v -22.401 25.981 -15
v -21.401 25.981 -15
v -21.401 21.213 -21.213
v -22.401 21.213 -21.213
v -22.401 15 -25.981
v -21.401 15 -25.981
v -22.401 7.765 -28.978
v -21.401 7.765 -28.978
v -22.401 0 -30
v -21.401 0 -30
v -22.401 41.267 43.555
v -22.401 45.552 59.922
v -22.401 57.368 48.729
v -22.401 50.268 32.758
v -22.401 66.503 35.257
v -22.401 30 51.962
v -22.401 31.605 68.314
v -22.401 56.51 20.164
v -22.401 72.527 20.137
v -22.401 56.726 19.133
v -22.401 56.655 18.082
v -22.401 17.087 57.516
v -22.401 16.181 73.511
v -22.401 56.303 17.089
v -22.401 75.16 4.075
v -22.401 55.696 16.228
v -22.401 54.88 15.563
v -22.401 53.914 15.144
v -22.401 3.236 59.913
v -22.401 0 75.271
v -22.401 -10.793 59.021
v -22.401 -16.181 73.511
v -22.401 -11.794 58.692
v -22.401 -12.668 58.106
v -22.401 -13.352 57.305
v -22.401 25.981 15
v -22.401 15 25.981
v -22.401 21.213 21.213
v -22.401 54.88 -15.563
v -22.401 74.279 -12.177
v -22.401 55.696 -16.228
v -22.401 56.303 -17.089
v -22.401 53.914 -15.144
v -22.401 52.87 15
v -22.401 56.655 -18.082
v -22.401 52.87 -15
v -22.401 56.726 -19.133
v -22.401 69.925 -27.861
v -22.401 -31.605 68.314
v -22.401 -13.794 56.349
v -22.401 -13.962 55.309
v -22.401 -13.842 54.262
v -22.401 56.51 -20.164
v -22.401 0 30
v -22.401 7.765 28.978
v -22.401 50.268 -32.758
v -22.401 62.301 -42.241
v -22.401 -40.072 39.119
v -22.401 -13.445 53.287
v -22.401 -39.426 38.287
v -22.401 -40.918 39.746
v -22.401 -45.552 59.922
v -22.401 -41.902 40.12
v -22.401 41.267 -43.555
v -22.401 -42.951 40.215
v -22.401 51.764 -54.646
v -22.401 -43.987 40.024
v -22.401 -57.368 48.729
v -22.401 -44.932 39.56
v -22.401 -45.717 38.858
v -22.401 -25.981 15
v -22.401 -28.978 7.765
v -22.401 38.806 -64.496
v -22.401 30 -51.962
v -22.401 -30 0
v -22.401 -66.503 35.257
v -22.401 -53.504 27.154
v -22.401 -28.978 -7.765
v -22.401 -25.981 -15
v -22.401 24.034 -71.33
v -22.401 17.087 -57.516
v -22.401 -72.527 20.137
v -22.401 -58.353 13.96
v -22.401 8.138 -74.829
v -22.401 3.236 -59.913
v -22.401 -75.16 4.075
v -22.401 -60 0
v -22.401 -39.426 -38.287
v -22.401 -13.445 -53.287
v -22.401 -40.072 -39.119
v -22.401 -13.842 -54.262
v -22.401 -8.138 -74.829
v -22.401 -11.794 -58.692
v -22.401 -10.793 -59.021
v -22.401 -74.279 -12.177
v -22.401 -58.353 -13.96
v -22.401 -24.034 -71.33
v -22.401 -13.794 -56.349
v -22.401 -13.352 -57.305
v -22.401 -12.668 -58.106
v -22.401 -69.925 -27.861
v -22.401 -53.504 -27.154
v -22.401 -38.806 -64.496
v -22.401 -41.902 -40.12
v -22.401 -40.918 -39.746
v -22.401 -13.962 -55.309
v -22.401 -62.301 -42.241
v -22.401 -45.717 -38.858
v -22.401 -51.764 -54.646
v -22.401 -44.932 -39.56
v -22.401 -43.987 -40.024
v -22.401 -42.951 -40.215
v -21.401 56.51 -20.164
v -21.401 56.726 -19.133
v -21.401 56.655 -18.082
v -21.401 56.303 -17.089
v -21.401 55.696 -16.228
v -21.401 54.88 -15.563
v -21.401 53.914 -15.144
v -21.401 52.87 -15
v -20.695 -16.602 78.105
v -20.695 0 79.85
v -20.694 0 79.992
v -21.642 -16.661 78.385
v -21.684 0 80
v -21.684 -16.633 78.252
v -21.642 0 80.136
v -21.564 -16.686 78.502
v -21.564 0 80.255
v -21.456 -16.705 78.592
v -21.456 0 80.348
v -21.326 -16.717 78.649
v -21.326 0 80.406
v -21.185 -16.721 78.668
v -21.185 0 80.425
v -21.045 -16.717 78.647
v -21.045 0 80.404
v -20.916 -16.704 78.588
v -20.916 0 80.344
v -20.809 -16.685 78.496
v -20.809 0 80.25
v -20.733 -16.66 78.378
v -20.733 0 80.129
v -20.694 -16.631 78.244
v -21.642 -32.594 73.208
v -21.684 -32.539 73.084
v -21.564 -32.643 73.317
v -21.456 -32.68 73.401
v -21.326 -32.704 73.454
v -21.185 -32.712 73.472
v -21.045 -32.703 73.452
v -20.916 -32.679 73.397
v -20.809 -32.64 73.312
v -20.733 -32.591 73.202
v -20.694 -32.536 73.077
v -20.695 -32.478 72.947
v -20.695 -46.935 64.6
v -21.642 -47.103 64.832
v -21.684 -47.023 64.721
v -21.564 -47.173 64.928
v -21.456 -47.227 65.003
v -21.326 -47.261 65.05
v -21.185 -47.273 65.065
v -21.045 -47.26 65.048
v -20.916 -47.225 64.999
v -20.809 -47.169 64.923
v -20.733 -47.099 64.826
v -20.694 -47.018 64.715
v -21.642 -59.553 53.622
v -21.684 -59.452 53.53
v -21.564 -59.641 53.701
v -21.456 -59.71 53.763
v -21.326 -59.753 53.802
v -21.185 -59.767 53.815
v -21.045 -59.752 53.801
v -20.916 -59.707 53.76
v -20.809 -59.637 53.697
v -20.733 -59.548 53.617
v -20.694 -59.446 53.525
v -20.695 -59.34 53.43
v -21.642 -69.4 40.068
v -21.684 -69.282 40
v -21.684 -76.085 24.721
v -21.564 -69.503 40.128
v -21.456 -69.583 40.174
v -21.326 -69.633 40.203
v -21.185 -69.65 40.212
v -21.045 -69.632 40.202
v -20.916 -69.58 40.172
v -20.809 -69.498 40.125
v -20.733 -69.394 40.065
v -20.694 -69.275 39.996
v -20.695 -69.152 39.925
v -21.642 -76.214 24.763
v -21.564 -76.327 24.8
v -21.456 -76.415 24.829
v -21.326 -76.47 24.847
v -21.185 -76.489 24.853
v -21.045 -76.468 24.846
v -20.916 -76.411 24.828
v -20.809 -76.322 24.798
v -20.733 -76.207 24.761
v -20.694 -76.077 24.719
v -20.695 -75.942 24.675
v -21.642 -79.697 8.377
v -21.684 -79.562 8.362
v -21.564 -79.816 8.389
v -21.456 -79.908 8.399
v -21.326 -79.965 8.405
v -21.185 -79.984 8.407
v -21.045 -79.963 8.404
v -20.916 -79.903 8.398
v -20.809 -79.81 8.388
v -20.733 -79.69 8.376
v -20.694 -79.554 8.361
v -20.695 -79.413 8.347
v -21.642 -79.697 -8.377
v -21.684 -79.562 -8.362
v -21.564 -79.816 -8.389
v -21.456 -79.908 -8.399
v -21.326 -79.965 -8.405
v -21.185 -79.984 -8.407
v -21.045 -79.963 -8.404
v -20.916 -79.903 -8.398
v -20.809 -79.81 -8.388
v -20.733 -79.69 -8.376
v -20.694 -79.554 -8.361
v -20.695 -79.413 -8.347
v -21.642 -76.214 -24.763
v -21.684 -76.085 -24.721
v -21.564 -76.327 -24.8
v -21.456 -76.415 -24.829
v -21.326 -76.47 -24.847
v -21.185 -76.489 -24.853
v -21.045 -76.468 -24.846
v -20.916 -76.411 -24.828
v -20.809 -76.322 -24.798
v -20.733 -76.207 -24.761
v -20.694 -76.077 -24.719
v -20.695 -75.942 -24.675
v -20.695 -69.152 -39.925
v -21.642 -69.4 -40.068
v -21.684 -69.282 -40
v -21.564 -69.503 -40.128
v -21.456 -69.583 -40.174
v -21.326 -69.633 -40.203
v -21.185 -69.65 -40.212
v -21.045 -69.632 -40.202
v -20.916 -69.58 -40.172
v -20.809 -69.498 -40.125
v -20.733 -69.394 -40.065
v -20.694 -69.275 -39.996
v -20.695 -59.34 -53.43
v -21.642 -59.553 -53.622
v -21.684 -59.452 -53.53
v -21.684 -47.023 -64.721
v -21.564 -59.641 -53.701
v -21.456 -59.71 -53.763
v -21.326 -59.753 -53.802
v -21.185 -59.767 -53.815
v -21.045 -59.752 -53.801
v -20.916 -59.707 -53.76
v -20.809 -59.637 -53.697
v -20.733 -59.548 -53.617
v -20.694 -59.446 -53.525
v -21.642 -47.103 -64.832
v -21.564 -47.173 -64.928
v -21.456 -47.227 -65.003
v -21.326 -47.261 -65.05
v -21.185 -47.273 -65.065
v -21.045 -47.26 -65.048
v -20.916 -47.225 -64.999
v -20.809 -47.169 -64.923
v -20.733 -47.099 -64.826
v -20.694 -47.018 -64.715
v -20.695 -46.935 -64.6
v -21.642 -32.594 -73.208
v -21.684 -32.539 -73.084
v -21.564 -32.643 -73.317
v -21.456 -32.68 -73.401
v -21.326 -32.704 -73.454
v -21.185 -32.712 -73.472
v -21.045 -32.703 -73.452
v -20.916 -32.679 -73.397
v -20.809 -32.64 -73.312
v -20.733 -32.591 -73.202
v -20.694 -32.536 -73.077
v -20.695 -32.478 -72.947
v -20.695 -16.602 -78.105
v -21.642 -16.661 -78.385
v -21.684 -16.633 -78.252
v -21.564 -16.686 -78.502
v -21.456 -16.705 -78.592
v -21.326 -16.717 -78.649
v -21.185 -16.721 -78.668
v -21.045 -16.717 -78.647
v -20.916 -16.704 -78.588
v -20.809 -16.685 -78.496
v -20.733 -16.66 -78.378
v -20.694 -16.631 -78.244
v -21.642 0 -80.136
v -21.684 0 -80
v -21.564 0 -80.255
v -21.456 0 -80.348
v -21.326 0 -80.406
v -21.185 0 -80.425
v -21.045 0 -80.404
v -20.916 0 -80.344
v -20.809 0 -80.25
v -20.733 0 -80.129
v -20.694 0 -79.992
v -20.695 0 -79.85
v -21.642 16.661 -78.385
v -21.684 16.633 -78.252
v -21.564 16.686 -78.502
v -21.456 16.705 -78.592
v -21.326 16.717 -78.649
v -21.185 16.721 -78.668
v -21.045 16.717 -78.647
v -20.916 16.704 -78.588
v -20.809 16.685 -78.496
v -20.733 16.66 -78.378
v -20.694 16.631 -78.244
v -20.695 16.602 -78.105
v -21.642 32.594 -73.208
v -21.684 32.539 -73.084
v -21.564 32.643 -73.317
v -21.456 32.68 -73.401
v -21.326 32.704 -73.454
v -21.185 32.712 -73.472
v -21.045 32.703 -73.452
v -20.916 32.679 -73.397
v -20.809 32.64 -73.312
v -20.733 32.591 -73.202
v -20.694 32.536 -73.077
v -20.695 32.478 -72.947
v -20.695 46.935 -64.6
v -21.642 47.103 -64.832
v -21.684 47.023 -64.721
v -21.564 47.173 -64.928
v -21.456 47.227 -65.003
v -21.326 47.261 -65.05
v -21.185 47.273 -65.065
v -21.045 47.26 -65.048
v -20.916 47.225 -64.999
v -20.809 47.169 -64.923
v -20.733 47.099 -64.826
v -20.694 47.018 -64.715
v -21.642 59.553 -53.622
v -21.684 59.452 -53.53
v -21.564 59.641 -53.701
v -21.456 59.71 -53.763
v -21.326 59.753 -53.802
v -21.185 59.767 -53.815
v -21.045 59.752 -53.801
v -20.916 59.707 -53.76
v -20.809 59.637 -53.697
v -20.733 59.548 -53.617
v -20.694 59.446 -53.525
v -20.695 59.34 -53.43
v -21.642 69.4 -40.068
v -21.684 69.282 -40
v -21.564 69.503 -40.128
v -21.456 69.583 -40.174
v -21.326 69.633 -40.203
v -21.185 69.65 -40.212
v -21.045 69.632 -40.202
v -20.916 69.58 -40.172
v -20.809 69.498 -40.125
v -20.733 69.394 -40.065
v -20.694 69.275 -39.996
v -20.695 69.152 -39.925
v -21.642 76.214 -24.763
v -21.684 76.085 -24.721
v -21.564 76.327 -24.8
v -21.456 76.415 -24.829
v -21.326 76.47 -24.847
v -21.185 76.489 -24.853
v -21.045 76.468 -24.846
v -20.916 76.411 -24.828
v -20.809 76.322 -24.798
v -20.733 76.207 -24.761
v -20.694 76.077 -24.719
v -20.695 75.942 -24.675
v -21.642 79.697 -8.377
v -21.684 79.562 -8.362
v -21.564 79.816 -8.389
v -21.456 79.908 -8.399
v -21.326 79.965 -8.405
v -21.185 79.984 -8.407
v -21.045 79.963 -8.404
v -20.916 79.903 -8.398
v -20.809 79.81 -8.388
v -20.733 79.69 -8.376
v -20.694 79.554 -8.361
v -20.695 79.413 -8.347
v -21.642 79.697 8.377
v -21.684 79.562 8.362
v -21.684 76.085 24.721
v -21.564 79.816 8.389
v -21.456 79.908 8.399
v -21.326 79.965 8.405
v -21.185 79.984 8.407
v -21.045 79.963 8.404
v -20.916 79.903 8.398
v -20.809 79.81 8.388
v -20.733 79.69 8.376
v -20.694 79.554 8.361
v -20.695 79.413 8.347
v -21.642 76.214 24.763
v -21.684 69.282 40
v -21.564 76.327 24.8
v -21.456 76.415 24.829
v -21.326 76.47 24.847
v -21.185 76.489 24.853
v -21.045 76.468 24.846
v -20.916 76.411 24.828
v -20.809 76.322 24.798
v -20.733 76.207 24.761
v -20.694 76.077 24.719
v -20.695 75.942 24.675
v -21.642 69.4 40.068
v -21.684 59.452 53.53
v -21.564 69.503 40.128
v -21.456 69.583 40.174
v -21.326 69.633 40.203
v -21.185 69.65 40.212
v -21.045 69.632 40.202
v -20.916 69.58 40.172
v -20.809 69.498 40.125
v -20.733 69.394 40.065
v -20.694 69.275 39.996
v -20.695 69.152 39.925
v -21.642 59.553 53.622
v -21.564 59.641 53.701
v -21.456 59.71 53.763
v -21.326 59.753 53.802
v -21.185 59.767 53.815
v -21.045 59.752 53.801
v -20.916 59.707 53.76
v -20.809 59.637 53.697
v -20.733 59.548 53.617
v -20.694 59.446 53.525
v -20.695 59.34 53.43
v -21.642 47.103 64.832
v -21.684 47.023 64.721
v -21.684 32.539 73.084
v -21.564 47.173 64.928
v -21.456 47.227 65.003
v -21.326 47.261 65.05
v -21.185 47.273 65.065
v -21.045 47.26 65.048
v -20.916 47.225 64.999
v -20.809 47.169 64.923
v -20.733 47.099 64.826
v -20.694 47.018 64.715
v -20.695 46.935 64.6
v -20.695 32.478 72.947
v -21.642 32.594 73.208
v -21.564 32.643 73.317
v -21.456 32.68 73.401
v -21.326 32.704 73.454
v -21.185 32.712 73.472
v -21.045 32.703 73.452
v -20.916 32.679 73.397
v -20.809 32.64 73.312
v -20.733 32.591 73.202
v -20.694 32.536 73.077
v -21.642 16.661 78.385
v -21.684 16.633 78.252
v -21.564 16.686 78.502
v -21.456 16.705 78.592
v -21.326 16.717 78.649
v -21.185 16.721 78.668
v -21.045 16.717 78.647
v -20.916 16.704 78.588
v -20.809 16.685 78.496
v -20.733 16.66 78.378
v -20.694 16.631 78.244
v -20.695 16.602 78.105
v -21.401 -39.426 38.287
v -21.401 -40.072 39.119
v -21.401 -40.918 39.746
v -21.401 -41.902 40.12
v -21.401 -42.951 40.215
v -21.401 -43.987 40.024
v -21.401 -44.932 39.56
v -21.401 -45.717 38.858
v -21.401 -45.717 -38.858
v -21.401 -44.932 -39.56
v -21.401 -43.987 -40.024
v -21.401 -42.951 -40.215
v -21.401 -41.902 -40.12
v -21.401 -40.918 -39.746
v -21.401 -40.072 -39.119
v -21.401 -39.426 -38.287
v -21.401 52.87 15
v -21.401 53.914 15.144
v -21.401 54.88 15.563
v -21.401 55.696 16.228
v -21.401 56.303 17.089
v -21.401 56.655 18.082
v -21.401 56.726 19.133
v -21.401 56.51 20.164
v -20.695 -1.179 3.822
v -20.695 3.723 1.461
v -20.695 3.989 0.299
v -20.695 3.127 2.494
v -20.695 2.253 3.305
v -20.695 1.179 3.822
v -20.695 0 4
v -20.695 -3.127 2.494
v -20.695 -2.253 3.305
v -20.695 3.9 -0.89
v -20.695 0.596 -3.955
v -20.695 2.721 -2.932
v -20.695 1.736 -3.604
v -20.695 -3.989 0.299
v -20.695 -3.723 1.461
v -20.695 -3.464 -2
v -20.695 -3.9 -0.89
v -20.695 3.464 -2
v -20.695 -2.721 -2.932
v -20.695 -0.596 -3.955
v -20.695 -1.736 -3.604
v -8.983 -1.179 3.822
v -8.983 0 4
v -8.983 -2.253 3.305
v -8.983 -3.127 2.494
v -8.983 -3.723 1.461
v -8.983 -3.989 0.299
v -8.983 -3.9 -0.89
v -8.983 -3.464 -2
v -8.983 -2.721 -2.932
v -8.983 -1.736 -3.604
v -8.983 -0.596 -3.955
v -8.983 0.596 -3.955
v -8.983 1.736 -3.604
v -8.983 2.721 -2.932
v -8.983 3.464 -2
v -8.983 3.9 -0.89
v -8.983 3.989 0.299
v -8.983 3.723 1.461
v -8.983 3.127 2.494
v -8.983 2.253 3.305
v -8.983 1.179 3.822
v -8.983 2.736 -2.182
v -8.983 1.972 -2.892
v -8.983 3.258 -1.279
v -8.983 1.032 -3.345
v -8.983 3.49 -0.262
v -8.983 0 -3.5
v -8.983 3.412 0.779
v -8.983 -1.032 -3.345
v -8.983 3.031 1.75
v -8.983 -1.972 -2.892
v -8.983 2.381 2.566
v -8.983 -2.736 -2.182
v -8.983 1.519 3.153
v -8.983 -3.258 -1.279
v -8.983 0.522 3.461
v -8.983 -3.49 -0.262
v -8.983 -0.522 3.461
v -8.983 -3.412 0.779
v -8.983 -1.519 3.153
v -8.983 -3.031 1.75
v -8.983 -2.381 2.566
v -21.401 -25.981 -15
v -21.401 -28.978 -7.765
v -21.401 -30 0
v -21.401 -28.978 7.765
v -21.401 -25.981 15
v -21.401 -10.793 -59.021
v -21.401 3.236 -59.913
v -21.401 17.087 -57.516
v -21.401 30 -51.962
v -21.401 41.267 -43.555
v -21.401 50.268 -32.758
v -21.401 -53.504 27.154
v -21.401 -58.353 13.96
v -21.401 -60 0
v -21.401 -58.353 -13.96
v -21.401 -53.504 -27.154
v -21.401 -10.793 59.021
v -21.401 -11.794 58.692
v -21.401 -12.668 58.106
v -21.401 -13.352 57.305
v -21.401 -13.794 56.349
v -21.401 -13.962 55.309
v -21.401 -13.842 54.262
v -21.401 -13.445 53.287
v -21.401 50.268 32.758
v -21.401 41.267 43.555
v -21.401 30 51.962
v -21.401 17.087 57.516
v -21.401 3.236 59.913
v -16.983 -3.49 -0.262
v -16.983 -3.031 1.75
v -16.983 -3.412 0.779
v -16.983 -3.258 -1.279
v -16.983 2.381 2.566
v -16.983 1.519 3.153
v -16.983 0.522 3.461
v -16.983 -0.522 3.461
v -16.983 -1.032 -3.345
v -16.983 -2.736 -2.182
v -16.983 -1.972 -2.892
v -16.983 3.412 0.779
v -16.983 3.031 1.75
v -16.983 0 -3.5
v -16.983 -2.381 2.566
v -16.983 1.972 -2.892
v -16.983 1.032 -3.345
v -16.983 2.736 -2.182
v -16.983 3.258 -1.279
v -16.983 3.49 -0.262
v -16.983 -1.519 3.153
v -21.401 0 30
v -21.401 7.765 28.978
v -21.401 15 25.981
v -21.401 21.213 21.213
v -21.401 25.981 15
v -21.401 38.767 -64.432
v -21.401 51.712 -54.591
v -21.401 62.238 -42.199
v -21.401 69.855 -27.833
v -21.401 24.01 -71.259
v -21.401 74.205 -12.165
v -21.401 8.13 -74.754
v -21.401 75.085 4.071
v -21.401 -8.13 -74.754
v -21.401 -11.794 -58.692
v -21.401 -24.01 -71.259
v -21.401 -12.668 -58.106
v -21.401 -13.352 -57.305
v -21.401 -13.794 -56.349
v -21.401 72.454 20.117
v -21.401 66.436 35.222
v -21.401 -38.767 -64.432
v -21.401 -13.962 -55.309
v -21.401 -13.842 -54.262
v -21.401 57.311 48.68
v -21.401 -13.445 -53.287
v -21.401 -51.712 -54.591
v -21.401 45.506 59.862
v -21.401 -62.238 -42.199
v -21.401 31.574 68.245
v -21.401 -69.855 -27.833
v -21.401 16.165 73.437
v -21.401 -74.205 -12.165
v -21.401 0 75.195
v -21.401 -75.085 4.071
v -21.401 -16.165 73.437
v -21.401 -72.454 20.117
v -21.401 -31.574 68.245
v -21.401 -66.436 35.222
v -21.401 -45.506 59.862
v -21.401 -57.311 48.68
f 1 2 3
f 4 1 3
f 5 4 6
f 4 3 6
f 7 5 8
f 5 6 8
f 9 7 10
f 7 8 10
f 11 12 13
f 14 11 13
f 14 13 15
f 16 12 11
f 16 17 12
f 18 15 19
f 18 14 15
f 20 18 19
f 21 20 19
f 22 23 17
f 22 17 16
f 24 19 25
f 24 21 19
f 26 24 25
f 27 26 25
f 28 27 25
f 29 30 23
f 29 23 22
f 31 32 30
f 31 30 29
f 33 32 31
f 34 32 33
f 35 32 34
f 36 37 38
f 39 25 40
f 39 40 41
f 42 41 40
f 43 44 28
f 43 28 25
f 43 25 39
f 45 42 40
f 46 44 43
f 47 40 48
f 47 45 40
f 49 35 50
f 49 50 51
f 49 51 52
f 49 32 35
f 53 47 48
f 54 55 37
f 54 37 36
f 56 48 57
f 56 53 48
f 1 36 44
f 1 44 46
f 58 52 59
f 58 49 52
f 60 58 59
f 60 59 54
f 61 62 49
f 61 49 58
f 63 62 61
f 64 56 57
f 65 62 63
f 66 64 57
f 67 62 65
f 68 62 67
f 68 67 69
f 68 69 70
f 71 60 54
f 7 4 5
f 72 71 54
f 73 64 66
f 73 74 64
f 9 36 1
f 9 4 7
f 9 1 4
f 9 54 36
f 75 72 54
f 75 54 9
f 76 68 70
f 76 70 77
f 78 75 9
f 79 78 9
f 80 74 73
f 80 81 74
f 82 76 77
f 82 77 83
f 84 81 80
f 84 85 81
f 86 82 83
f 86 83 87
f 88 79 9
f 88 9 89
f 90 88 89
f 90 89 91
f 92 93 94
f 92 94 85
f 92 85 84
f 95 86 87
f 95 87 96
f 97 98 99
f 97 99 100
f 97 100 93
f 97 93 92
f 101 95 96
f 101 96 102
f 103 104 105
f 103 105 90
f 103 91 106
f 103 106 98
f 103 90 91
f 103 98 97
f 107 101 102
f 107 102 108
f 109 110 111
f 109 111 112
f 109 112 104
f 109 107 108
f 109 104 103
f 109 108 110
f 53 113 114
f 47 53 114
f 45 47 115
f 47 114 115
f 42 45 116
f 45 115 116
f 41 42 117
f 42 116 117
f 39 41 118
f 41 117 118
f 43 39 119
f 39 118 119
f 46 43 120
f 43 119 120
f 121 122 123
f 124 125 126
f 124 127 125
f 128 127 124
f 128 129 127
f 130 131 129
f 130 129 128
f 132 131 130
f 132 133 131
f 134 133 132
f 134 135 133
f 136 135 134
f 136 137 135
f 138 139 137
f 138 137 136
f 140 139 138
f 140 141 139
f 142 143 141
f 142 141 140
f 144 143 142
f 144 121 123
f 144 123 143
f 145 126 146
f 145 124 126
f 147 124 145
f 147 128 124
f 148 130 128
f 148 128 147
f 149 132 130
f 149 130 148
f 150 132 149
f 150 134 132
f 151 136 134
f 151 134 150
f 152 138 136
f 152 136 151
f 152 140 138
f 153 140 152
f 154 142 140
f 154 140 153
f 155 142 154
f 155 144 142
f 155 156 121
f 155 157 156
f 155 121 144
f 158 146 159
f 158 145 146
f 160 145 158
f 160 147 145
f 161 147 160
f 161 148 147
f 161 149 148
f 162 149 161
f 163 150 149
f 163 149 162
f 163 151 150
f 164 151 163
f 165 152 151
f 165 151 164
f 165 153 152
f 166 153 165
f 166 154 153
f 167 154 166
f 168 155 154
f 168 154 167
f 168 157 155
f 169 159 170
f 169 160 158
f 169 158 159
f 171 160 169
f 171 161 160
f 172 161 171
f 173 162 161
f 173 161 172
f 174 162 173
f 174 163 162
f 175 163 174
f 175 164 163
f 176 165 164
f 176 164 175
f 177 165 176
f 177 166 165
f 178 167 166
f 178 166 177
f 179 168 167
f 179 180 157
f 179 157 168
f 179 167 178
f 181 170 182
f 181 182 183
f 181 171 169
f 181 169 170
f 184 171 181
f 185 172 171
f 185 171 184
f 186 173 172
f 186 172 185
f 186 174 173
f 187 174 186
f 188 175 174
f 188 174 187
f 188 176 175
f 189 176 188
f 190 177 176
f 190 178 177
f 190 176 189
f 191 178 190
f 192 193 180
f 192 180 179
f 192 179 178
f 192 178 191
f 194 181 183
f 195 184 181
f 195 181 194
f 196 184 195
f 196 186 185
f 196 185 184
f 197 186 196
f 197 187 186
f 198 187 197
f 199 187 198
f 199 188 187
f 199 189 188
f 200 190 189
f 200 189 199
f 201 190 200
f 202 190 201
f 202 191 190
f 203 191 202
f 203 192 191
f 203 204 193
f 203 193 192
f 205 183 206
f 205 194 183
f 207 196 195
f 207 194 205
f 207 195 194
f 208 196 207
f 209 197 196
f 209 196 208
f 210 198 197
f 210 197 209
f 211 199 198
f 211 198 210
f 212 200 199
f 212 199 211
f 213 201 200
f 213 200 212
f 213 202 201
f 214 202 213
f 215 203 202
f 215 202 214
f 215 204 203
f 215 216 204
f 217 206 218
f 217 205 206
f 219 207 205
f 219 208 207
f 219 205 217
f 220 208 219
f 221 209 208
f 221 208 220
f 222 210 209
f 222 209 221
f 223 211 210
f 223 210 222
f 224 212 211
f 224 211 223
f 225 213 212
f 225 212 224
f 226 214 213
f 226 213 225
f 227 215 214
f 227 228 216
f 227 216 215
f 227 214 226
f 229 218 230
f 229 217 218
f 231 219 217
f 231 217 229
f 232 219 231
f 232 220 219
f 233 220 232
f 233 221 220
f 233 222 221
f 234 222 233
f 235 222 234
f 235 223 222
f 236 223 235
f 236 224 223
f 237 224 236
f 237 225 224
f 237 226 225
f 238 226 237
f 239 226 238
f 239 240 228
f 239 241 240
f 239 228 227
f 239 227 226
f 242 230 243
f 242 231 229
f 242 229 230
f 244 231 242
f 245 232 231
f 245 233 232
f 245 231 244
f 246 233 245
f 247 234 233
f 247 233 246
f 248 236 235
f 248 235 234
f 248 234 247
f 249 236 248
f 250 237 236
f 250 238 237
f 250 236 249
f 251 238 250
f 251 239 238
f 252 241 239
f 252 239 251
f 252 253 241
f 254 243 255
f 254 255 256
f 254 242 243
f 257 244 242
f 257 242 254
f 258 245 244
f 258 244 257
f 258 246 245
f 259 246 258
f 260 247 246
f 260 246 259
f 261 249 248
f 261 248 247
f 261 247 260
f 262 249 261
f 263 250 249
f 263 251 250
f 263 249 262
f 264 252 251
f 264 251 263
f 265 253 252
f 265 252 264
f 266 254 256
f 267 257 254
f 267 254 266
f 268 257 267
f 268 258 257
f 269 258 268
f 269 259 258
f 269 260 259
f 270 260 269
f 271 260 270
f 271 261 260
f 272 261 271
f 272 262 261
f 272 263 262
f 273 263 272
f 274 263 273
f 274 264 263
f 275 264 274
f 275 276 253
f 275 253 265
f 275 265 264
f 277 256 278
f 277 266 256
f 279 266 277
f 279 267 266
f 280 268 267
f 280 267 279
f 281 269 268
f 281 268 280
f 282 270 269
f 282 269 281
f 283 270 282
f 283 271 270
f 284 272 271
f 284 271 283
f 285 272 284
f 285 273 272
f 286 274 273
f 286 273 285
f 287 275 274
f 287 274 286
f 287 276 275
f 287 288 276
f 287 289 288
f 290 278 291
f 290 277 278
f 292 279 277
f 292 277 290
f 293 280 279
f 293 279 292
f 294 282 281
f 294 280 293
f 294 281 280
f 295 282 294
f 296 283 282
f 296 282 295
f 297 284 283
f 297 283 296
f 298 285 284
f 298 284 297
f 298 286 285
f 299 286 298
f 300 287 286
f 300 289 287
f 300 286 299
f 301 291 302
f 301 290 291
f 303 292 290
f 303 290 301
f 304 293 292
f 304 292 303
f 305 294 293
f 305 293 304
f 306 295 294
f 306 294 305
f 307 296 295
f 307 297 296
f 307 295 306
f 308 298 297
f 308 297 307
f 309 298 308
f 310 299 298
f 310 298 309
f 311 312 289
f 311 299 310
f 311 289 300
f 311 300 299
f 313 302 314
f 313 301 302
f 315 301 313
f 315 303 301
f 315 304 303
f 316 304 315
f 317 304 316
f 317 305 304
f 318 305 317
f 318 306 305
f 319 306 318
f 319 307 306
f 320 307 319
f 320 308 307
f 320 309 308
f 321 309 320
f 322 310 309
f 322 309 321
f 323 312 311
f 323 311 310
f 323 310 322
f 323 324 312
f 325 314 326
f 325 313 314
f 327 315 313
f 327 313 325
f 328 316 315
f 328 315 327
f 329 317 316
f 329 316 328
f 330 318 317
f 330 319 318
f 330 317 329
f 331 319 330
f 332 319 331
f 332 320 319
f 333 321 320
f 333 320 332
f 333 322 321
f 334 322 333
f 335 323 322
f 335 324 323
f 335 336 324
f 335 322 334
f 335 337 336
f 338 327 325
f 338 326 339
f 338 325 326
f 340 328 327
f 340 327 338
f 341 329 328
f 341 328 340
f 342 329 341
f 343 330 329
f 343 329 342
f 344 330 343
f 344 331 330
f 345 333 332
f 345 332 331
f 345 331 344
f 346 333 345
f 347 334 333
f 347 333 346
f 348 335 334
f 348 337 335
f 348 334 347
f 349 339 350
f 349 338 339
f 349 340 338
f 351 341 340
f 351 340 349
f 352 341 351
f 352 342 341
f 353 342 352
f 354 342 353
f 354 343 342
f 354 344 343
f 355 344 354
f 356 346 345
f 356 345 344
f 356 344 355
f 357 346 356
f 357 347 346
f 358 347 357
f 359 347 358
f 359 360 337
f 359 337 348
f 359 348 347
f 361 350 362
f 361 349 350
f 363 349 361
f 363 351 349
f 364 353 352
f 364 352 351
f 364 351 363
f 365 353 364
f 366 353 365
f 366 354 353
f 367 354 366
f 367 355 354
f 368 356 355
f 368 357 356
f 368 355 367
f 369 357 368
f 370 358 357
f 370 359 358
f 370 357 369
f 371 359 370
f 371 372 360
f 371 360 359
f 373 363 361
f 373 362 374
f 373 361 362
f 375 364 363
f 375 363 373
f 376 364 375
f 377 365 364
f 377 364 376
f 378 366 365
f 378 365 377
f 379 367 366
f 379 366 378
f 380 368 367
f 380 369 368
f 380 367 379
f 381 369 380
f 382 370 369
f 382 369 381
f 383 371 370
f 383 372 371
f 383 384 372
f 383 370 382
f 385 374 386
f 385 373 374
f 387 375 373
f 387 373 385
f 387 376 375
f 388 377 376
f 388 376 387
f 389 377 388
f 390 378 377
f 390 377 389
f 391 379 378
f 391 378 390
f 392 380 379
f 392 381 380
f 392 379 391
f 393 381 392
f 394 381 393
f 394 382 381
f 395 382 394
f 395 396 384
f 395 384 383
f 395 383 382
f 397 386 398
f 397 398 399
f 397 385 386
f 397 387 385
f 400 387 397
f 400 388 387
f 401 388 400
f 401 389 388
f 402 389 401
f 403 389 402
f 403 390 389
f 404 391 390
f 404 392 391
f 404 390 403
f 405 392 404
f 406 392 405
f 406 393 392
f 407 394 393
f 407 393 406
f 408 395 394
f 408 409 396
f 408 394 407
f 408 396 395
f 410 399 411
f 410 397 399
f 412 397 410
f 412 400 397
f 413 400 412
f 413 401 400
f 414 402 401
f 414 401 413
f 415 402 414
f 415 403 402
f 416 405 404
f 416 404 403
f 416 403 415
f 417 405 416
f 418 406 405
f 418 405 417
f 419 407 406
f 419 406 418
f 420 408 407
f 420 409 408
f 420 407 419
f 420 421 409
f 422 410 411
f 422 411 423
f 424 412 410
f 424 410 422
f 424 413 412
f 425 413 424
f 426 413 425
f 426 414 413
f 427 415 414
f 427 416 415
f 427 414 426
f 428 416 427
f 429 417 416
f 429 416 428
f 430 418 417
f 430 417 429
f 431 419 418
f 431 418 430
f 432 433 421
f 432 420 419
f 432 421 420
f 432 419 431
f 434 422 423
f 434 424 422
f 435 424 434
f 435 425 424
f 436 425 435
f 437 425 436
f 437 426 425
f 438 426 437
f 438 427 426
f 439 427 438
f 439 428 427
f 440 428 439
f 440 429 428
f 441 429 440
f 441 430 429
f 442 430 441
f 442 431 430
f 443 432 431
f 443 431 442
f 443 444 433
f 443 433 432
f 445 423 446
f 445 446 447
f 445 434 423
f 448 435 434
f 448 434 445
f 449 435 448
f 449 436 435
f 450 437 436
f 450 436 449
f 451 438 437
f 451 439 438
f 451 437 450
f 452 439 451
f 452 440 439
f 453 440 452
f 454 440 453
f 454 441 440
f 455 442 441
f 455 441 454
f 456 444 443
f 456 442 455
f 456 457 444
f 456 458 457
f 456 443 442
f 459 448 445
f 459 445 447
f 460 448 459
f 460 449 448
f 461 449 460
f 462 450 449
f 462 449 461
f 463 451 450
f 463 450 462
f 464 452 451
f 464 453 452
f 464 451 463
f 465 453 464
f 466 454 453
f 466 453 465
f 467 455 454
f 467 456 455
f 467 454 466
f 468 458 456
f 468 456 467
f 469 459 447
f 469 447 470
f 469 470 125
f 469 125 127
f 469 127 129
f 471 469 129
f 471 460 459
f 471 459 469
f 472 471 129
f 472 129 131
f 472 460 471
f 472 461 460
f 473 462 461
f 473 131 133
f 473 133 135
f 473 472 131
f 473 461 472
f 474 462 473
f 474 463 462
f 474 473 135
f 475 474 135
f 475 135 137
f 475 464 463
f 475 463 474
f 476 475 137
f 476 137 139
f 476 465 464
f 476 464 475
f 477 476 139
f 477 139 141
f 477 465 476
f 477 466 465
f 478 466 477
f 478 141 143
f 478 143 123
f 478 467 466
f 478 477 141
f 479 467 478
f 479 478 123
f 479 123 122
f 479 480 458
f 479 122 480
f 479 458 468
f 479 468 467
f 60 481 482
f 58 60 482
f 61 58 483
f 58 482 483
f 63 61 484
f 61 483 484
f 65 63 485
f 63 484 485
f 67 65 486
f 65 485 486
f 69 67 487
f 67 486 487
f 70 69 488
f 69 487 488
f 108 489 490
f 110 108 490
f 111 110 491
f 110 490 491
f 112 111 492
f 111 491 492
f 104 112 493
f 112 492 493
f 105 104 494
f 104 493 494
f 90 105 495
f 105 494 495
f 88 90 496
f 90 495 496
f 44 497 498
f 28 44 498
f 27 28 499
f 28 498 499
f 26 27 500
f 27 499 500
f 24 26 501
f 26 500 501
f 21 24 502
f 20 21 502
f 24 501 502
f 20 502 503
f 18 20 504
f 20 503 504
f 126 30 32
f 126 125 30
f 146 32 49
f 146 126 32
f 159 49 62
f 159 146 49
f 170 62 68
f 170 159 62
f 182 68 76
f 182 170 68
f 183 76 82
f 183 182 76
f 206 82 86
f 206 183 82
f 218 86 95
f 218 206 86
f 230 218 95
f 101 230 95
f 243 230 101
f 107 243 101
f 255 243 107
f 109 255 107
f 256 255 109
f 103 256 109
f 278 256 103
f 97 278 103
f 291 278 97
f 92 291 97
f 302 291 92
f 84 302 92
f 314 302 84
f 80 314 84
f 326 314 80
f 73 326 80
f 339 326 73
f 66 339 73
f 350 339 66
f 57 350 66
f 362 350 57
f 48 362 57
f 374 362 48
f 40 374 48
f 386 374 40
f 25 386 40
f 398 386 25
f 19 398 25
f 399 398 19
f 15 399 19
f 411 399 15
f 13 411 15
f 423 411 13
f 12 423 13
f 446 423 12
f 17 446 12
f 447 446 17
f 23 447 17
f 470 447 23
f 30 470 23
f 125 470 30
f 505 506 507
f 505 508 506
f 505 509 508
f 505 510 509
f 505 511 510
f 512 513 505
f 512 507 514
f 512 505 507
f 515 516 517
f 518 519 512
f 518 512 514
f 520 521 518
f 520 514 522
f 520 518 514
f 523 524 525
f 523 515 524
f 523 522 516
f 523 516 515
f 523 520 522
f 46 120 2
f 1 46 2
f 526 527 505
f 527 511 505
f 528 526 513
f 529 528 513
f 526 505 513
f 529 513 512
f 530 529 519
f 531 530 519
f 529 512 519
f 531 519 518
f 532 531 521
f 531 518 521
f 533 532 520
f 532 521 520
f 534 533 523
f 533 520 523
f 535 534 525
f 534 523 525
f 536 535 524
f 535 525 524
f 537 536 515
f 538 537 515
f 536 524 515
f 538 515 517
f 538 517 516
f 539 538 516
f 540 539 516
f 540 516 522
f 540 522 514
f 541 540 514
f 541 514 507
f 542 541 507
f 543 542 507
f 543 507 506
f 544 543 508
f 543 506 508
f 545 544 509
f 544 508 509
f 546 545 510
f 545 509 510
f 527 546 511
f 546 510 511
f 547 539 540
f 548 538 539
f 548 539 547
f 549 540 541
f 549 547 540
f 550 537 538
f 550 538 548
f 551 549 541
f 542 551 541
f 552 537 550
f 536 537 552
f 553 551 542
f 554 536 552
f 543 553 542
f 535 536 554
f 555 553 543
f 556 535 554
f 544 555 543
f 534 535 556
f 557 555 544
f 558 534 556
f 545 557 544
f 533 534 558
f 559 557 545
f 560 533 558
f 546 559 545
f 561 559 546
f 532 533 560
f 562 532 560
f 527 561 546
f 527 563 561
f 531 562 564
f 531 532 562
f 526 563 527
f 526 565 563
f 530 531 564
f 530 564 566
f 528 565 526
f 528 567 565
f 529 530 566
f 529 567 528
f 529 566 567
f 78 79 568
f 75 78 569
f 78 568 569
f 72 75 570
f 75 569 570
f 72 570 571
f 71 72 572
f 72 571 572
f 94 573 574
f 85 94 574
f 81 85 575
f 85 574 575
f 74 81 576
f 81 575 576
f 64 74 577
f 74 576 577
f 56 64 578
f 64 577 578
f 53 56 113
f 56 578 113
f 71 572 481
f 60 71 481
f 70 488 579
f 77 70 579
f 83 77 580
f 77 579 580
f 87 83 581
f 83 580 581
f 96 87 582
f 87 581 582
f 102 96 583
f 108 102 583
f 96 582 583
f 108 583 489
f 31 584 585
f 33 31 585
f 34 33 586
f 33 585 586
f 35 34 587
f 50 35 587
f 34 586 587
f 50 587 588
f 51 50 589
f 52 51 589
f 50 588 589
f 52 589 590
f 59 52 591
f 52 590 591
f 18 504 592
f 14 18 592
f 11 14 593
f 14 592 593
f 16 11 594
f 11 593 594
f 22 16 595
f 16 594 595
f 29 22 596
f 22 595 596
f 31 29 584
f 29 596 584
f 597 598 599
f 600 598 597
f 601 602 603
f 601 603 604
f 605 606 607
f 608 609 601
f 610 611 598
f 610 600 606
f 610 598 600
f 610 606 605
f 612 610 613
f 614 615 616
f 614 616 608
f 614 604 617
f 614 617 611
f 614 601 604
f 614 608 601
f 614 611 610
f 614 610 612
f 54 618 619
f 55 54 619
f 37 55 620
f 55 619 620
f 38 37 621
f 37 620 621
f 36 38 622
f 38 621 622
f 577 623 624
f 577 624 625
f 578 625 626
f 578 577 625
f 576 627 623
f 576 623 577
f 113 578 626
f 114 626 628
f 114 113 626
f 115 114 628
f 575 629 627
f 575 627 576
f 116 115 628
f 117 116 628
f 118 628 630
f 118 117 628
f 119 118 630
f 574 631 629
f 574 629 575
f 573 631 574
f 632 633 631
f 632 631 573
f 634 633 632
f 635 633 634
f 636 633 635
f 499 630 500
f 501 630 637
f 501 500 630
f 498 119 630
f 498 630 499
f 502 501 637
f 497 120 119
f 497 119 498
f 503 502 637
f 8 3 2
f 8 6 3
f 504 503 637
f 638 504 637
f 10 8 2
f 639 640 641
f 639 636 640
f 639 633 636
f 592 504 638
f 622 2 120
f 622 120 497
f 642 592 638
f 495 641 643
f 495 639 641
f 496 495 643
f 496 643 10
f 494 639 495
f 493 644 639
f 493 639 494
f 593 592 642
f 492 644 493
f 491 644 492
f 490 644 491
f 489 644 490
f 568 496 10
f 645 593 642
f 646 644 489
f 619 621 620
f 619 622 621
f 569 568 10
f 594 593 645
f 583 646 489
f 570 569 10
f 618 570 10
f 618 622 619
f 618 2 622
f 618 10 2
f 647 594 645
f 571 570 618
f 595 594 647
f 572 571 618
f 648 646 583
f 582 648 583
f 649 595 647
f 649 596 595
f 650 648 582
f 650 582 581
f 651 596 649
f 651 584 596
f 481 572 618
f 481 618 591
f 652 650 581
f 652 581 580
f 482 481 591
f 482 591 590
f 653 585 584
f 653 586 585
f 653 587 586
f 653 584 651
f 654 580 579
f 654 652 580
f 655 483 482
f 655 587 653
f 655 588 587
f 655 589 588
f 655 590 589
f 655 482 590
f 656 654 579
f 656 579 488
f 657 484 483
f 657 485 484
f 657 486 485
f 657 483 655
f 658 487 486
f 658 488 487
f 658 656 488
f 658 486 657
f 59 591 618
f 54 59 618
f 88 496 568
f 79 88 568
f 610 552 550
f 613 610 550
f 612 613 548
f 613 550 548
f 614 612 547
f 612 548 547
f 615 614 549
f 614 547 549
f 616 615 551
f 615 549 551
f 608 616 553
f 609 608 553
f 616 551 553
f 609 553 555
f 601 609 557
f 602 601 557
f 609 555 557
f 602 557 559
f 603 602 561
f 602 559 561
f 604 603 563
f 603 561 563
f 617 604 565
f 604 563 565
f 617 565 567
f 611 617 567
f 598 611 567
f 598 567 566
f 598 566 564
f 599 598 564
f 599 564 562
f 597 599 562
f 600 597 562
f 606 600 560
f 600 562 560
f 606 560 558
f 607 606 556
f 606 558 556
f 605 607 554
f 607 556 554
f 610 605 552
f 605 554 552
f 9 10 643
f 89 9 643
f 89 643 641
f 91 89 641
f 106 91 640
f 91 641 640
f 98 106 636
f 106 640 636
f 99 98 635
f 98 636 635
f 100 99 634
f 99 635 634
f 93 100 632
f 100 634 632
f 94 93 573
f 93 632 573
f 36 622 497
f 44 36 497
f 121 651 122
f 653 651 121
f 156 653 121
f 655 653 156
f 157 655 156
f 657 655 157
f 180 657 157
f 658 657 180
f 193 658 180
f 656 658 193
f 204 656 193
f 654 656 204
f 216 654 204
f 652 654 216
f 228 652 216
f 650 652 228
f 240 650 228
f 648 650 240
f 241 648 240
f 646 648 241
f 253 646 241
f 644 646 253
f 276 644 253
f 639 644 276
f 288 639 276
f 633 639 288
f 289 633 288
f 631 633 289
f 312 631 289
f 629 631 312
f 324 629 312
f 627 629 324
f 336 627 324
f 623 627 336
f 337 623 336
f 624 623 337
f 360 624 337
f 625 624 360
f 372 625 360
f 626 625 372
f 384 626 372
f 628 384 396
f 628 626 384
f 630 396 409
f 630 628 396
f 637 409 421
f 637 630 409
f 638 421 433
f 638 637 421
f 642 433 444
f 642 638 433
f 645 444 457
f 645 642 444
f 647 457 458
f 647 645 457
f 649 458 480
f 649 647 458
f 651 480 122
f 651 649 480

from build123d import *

# Parameters (mm, degrees)
CUT_EXTRUDE1_DEPTH = 114.74253479
SKETCH5_R          = 3.5
CUT_EXTRUDE2_DEPTH = 8


with BuildPart() as part:
    # Sketch1 → Revolve1 (revolve)
    with BuildSketch(Plane.XY, mode=Mode.PRIVATE) as revolve1_sk:
        with BuildLine():
            Line((-22.400929177, 0), (-22.400929177, 75.270674012))
            Line((-22.400929177, 75.270674012), (-21.683501684, 80))
            ThreePointArc((-21.683501684, 80), (-21.114166433, 80.419353518), (-20.694812916, 79.850018268))
            Line((-20.694812916, 79.850018268), (-21.400929177, 75.195256614))
            Line((-21.400929177, 75.195256614), (-21.400929177, 0))
            Line((-21.400929177, 0), (-22.400929177, 0))
        make_face()
    revolve(revolve1_sk.sketch.rotate(Axis((-22.400929177, 0, 0), (1, 0, 0)), 90), axis=Axis((-22.400929177, 0, 0), (1, 0, 0)))

    # Sketch2 → Cut-Extrude1 (cut, through all)
    with BuildSketch(Plane(origin=(-21.400929177, 0, 0), x_dir=(0, 0, -1), z_dir=(1, 0, 0))):
        with BuildLine():
            Line((-15, 25.980762114), (-15, 52.870468111))
            ThreePointArc((-15, 52.870468111), (-16.638004811, 56.029253081), (-20.163544097, 56.510454692))
            ThreePointArc((-20.163544097, 56.510454692), (-51.961524227, 30), (-59.021261391, -10.793085928))
            ThreePointArc((-59.021261391, -10.793085928), (-56.841758929, -13.605691706), (-53.287168494, -13.444852999))
            Line((-53.287168494, -13.444852999), (-30, 0))
            ThreePointArc((-30, 0), (-25.980762114, 15), (-15, 25.980762114))
        make_face()
        with BuildLine():
            ThreePointArc((15, -25.980762114), (0, -30), (-15, -25.980762114))
            Line((-15, -25.980762114), (-38.287168494, -39.425615112))
            ThreePointArc((-38.287168494, -39.425615112), (-40.203754118, -42.423561375), (-38.857717294, -45.717368764))
            ThreePointArc((-38.857717294, -45.717368764), (0, -60), (38.857717294, -45.717368764))
            ThreePointArc((38.857717294, -45.717368764), (40.203754118, -42.423561375), (38.287168494, -39.425615112))
            Line((38.287168494, -39.425615112), (15, -25.980762114))
        make_face()
        with BuildLine():
            Line((15, 52.870468111), (15, 25.980762114))
            ThreePointArc((15, 25.980762114), (25.980762114, 15), (30, 0))
            Line((30, 0), (53.287168494, -13.444852999))
            ThreePointArc((53.287168494, -13.444852999), (56.841758929, -13.605691706), (59.021261391, -10.793085928))
            ThreePointArc((59.021261391, -10.793085928), (51.961524227, 30), (20.163544097, 56.510454692))
            ThreePointArc((20.163544097, 56.510454692), (16.638004811, 56.029253081), (15, 52.870468111))
        make_face()
    extrude(amount=-CUT_EXTRUDE1_DEPTH, mode=Mode.SUBTRACT)


with BuildPart() as body_2:
    # Sketch4 → Revolve2 (revolve)
    with BuildSketch(Plane.XY, mode=Mode.PRIVATE) as revolve2_sk:
        Polygon((-18.982708488, 4), (-8.982708488, 4), (-8.982708488, 0), (-20.694812916, 0), (-20.694812916, 4), align=None)
    revolve(revolve2_sk.sketch.rotate(Axis((-20.694812916, 0, 0), (1, 0, 0)), 90), axis=Axis((-20.694812916, 0, 0), (1, 0, 0)))

    # Sketch5 → Cut-Extrude2 (cut)
    with BuildSketch(Plane(origin=(-8.982708488, 0, 0), x_dir=(0, 0, -1), z_dir=(1, 0, 0))):
        Circle(SKETCH5_R)
    extrude(amount=-CUT_EXTRUDE2_DEPTH, mode=Mode.SUBTRACT)


solid = Compound([part.part, body_2.part])
